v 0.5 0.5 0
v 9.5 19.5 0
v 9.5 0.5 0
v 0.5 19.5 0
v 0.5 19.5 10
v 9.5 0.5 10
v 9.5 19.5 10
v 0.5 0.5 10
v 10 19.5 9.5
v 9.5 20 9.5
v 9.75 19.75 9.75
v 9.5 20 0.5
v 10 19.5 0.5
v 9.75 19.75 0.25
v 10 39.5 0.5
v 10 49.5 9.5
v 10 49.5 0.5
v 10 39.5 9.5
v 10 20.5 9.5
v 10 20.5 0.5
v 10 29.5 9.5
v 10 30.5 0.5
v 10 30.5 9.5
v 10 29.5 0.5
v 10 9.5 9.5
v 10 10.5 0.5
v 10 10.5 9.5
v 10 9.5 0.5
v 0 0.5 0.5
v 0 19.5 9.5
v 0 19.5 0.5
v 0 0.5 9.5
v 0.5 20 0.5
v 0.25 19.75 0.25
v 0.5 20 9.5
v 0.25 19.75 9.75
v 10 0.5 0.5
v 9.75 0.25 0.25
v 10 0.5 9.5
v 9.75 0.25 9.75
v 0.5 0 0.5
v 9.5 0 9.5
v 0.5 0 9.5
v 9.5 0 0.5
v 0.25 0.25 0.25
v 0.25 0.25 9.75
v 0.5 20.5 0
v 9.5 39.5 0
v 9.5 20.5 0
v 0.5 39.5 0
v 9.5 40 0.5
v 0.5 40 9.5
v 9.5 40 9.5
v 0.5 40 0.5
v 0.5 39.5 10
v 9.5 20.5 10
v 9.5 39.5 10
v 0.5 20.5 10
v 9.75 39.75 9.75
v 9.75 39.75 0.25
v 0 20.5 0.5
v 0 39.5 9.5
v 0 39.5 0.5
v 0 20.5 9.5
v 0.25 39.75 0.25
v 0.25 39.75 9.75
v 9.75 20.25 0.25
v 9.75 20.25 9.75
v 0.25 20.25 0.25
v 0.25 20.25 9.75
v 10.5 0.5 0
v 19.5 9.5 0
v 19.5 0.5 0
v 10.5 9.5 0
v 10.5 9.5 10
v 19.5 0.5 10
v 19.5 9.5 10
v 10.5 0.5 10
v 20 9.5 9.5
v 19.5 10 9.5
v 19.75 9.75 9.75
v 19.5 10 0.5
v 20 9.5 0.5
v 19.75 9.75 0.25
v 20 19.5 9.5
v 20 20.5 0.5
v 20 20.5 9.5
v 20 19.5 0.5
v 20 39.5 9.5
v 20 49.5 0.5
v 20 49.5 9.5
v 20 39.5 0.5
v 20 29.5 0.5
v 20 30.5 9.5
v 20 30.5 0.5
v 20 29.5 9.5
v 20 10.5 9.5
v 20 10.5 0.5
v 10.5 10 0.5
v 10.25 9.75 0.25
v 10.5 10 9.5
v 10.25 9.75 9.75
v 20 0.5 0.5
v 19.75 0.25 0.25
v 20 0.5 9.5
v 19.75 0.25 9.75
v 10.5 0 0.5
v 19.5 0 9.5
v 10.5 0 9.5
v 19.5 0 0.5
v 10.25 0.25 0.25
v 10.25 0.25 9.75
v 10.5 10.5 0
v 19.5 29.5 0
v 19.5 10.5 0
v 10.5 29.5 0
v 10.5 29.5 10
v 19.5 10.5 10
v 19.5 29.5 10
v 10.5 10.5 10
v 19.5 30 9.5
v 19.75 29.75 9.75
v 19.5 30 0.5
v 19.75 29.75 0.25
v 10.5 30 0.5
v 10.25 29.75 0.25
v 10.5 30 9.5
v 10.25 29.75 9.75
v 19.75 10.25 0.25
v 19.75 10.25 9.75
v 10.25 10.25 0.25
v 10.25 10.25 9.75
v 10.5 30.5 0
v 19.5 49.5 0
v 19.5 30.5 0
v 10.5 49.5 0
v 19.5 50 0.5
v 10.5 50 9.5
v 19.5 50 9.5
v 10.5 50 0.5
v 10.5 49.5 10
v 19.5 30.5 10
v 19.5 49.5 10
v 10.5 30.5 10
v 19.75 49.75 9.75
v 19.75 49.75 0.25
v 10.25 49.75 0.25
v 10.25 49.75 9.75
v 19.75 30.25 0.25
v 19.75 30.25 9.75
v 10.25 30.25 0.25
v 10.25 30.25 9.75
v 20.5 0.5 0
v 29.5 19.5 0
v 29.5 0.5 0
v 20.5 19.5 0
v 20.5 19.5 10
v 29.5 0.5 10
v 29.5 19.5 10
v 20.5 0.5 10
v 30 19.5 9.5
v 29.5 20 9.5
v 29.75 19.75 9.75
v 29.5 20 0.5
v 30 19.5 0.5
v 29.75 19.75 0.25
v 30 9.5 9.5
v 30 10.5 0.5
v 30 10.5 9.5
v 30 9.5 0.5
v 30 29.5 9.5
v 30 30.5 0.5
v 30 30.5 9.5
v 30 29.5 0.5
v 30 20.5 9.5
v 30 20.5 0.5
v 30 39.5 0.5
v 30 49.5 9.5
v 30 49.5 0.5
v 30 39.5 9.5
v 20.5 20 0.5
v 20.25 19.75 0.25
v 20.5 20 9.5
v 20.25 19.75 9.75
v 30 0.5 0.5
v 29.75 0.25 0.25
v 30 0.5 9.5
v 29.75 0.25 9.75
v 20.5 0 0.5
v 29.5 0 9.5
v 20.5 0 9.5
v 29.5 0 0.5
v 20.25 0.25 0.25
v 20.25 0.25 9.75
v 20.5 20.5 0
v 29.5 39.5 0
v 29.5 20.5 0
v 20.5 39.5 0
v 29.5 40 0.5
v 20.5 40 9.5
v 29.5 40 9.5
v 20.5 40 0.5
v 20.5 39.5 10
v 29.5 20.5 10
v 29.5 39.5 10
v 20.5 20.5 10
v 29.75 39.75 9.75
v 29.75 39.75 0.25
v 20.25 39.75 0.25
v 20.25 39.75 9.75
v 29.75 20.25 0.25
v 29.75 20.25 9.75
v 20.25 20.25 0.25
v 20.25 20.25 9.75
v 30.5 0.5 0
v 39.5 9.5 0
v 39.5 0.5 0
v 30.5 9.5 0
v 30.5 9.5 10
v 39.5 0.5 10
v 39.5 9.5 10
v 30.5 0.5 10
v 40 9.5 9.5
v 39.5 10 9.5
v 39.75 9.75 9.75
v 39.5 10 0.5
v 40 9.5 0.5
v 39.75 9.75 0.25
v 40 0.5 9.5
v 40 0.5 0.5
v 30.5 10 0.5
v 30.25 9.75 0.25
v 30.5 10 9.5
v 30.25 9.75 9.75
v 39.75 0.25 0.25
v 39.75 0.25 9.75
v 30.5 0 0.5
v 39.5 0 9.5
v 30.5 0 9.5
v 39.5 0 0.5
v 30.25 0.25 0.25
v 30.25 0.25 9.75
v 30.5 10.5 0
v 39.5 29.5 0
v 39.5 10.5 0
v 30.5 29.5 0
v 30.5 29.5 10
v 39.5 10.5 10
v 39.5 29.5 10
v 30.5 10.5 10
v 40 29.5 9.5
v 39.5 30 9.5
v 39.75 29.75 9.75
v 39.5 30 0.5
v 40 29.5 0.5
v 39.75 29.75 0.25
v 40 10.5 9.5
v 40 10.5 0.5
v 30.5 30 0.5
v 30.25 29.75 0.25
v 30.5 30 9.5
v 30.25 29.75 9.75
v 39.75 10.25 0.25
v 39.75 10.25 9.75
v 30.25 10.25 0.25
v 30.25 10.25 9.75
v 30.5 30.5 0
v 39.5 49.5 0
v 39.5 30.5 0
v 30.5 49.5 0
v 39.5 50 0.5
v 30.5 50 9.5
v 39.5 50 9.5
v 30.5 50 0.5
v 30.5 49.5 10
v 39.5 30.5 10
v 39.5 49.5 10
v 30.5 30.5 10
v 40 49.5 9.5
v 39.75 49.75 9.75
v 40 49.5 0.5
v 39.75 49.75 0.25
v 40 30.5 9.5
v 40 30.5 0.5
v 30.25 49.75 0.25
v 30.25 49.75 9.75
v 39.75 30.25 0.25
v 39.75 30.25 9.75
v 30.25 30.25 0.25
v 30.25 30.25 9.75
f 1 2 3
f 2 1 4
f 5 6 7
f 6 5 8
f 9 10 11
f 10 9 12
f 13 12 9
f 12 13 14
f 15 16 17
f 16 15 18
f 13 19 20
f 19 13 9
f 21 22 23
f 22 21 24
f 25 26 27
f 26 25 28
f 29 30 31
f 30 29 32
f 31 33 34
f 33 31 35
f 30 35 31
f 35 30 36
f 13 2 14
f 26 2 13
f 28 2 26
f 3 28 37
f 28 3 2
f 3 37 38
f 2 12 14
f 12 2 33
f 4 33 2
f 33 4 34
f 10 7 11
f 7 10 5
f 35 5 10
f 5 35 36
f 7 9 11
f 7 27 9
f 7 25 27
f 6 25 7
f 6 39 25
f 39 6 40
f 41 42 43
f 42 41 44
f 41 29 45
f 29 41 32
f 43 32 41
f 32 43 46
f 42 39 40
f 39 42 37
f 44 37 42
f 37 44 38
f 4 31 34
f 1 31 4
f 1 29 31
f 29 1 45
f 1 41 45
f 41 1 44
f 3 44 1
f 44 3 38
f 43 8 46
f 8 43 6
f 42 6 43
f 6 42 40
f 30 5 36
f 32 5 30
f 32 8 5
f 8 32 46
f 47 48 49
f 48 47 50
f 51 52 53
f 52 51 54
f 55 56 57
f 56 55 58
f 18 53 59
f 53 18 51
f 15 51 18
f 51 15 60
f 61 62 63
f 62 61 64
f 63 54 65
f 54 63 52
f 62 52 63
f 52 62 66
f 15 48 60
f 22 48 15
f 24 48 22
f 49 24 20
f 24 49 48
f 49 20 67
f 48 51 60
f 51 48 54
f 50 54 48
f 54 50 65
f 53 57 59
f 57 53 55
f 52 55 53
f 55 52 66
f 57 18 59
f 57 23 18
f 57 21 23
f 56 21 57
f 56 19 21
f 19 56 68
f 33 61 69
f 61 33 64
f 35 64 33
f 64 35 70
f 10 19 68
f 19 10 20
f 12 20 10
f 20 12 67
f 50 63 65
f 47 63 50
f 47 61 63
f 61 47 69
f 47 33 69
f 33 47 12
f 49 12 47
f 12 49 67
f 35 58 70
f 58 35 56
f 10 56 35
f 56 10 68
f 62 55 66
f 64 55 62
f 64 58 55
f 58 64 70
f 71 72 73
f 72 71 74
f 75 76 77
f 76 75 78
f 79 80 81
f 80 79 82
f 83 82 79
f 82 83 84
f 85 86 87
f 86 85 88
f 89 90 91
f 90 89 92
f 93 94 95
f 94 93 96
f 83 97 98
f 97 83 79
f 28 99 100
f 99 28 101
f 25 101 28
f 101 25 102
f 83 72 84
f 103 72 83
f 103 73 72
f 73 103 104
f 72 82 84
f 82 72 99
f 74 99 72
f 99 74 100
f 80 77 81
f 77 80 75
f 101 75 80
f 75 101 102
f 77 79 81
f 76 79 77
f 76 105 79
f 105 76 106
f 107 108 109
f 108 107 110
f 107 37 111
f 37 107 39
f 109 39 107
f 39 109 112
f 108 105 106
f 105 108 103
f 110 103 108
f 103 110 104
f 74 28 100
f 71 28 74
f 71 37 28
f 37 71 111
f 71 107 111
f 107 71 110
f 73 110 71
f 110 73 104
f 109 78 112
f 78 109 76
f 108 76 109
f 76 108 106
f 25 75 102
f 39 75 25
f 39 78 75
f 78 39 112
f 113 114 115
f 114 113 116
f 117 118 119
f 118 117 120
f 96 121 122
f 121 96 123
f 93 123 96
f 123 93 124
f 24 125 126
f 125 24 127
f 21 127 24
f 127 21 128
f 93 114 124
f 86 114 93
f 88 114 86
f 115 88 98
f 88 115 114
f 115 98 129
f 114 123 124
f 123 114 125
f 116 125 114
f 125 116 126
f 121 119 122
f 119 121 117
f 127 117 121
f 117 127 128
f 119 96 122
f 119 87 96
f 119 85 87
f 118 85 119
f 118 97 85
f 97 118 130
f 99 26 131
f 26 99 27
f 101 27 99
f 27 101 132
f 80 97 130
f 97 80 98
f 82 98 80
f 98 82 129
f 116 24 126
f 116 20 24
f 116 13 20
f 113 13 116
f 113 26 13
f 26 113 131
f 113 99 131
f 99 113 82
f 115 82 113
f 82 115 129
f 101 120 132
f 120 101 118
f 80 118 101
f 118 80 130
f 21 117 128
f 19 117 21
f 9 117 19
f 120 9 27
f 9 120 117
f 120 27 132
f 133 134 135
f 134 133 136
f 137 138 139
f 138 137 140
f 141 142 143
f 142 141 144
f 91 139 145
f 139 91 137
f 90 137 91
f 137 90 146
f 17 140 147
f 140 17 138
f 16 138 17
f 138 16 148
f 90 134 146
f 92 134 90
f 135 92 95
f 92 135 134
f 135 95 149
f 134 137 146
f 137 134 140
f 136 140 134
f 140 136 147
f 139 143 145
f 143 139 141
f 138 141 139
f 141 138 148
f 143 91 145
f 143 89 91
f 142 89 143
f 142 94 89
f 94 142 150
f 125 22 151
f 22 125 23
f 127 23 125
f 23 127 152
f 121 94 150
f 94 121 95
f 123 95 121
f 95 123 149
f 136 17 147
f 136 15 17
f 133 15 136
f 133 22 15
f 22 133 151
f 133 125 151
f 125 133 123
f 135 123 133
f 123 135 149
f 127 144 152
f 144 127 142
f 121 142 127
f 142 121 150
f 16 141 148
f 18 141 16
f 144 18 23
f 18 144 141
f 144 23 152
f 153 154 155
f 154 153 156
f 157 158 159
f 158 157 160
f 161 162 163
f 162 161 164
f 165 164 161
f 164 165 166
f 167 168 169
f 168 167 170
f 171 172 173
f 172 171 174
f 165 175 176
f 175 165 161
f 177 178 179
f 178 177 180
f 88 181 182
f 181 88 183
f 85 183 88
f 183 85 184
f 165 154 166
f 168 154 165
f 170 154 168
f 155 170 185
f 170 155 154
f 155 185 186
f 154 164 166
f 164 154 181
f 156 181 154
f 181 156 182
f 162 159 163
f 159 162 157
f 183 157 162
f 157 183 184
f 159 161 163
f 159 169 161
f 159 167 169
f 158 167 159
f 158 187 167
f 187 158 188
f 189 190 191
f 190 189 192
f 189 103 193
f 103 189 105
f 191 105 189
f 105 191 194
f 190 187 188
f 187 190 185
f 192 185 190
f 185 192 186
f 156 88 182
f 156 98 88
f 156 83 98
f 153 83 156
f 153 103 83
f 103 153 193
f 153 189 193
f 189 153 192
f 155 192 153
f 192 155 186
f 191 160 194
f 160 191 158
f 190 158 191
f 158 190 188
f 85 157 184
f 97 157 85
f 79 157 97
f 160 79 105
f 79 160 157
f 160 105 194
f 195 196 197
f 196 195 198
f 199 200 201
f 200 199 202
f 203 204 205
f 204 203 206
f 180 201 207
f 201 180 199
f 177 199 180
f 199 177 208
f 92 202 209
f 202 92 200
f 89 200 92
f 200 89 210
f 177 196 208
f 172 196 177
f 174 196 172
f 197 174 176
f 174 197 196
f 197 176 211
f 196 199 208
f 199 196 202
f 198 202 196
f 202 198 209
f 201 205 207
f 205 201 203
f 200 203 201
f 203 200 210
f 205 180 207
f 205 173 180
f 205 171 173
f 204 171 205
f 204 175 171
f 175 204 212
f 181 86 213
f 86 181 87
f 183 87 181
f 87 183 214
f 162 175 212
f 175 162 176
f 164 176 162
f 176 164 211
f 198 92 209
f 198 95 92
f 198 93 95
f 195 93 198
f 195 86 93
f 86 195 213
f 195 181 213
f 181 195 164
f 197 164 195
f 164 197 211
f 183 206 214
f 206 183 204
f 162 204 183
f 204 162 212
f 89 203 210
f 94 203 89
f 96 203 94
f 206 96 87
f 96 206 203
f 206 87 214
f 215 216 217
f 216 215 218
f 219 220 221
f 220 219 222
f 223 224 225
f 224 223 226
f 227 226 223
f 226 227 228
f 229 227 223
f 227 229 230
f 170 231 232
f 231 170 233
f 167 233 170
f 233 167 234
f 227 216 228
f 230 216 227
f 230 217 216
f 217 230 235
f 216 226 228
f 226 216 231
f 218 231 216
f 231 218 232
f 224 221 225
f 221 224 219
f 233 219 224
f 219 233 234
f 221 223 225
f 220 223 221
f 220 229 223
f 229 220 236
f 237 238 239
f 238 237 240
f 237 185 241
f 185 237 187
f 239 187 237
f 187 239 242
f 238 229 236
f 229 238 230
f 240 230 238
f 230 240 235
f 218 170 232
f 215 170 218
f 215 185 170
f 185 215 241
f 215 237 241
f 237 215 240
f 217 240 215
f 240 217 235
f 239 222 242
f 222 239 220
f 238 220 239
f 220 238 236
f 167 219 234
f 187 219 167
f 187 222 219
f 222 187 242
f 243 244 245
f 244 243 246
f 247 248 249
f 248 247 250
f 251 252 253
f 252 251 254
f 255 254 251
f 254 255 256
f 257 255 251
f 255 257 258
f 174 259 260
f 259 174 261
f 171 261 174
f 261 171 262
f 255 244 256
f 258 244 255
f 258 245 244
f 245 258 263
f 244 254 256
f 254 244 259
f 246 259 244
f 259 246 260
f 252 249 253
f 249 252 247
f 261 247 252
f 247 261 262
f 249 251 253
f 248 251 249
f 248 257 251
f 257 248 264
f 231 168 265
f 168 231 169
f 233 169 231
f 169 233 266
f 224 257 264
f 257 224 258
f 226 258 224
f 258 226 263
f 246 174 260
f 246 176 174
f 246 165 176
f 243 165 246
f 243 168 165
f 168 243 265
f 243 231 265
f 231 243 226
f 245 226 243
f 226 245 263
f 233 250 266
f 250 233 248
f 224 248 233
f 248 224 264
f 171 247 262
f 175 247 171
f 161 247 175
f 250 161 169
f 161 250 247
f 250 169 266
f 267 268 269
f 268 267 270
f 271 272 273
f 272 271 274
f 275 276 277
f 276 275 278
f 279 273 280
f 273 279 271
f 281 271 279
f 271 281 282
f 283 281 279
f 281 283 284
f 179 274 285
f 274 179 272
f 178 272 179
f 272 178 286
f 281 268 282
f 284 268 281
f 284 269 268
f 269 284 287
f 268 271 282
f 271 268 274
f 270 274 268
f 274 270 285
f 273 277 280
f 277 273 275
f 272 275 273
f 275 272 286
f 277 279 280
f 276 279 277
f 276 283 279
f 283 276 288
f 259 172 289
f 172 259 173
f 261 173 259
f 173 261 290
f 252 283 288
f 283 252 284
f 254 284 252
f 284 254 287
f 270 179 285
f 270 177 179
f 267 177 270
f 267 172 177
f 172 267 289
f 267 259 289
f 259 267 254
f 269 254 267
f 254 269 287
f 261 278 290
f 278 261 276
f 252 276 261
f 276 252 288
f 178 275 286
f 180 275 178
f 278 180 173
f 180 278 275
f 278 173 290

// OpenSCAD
module brick(l=10,w=20,h=10,g=0.5) {
difference() {
cube([l,w,h]);
linear_extrude(height=h) polygon(points=[[0,0],[0,g],[g,0]]);
linear_extrude(height=h) polygon(points=[[l-g,0],[l,0],[l,g]]);
translate([0,w,0])
rotate([90,0,0]) linear_extrude(height=w) polygon([[0,0],[0,g],[g,0]]);
translate([l,0,0]) rotate([0,270,0]) linear_extrude(height=l) polygon([[0,0],[0,g],[g,0]]);
translate([l,0,h])
mirror([0,0,1]) rotate([0,270,0]) linear_extrude(height=l) polygon([[0,0],[0,g],[g,0]]);
translate([0,w,h-g])
rotate([90,0,0])
linear_extrude(height=w)
polygon([[0,0],[0,g],[g,g]]);
translate([l,w,0])
mirror([0,1,0]) mirror([1,0,0]) { linear_extrude(height=h) polygon(points=[[0,0],[0,g],[g,0]]);
linear_extrude(height=h) polygon(points=[[l-g,0],[l,0],[l,g]]);
translate([0,w,0])
rotate([90,0,0]) linear_extrude(height=w) polygon([[0,0],[0,g],[g,0]]);
translate([l,0,0]) rotate([0,270,0]) linear_extrude(height=l) polygon([[0,0],[0,g],[g,0]]);
translate([l,0,h])
mirror([0,0,1]) rotate([0,270,0]) linear_extrude(height=l) polygon([[0,0],[0,g],[g,0]]);
translate([0,w,h-g])
rotate([90,0,0])
linear_extrude(height=w)
polygon([[0,0],[0,g],[g,g]]);
}
}
}
brick(); translate([0,20,0]) brick();
translate([10,0,0]) brick(w=10,h=10); translate([10,10,0]) brick(); translate([10,30,0]) brick();
translate([20,0,0]) brick(); translate([20,20,0]) brick();
translate([30,0,0]) brick(w=10); translate([30,10,0]) brick(); translate([30,30,0]) brick();
/*/
//*/
